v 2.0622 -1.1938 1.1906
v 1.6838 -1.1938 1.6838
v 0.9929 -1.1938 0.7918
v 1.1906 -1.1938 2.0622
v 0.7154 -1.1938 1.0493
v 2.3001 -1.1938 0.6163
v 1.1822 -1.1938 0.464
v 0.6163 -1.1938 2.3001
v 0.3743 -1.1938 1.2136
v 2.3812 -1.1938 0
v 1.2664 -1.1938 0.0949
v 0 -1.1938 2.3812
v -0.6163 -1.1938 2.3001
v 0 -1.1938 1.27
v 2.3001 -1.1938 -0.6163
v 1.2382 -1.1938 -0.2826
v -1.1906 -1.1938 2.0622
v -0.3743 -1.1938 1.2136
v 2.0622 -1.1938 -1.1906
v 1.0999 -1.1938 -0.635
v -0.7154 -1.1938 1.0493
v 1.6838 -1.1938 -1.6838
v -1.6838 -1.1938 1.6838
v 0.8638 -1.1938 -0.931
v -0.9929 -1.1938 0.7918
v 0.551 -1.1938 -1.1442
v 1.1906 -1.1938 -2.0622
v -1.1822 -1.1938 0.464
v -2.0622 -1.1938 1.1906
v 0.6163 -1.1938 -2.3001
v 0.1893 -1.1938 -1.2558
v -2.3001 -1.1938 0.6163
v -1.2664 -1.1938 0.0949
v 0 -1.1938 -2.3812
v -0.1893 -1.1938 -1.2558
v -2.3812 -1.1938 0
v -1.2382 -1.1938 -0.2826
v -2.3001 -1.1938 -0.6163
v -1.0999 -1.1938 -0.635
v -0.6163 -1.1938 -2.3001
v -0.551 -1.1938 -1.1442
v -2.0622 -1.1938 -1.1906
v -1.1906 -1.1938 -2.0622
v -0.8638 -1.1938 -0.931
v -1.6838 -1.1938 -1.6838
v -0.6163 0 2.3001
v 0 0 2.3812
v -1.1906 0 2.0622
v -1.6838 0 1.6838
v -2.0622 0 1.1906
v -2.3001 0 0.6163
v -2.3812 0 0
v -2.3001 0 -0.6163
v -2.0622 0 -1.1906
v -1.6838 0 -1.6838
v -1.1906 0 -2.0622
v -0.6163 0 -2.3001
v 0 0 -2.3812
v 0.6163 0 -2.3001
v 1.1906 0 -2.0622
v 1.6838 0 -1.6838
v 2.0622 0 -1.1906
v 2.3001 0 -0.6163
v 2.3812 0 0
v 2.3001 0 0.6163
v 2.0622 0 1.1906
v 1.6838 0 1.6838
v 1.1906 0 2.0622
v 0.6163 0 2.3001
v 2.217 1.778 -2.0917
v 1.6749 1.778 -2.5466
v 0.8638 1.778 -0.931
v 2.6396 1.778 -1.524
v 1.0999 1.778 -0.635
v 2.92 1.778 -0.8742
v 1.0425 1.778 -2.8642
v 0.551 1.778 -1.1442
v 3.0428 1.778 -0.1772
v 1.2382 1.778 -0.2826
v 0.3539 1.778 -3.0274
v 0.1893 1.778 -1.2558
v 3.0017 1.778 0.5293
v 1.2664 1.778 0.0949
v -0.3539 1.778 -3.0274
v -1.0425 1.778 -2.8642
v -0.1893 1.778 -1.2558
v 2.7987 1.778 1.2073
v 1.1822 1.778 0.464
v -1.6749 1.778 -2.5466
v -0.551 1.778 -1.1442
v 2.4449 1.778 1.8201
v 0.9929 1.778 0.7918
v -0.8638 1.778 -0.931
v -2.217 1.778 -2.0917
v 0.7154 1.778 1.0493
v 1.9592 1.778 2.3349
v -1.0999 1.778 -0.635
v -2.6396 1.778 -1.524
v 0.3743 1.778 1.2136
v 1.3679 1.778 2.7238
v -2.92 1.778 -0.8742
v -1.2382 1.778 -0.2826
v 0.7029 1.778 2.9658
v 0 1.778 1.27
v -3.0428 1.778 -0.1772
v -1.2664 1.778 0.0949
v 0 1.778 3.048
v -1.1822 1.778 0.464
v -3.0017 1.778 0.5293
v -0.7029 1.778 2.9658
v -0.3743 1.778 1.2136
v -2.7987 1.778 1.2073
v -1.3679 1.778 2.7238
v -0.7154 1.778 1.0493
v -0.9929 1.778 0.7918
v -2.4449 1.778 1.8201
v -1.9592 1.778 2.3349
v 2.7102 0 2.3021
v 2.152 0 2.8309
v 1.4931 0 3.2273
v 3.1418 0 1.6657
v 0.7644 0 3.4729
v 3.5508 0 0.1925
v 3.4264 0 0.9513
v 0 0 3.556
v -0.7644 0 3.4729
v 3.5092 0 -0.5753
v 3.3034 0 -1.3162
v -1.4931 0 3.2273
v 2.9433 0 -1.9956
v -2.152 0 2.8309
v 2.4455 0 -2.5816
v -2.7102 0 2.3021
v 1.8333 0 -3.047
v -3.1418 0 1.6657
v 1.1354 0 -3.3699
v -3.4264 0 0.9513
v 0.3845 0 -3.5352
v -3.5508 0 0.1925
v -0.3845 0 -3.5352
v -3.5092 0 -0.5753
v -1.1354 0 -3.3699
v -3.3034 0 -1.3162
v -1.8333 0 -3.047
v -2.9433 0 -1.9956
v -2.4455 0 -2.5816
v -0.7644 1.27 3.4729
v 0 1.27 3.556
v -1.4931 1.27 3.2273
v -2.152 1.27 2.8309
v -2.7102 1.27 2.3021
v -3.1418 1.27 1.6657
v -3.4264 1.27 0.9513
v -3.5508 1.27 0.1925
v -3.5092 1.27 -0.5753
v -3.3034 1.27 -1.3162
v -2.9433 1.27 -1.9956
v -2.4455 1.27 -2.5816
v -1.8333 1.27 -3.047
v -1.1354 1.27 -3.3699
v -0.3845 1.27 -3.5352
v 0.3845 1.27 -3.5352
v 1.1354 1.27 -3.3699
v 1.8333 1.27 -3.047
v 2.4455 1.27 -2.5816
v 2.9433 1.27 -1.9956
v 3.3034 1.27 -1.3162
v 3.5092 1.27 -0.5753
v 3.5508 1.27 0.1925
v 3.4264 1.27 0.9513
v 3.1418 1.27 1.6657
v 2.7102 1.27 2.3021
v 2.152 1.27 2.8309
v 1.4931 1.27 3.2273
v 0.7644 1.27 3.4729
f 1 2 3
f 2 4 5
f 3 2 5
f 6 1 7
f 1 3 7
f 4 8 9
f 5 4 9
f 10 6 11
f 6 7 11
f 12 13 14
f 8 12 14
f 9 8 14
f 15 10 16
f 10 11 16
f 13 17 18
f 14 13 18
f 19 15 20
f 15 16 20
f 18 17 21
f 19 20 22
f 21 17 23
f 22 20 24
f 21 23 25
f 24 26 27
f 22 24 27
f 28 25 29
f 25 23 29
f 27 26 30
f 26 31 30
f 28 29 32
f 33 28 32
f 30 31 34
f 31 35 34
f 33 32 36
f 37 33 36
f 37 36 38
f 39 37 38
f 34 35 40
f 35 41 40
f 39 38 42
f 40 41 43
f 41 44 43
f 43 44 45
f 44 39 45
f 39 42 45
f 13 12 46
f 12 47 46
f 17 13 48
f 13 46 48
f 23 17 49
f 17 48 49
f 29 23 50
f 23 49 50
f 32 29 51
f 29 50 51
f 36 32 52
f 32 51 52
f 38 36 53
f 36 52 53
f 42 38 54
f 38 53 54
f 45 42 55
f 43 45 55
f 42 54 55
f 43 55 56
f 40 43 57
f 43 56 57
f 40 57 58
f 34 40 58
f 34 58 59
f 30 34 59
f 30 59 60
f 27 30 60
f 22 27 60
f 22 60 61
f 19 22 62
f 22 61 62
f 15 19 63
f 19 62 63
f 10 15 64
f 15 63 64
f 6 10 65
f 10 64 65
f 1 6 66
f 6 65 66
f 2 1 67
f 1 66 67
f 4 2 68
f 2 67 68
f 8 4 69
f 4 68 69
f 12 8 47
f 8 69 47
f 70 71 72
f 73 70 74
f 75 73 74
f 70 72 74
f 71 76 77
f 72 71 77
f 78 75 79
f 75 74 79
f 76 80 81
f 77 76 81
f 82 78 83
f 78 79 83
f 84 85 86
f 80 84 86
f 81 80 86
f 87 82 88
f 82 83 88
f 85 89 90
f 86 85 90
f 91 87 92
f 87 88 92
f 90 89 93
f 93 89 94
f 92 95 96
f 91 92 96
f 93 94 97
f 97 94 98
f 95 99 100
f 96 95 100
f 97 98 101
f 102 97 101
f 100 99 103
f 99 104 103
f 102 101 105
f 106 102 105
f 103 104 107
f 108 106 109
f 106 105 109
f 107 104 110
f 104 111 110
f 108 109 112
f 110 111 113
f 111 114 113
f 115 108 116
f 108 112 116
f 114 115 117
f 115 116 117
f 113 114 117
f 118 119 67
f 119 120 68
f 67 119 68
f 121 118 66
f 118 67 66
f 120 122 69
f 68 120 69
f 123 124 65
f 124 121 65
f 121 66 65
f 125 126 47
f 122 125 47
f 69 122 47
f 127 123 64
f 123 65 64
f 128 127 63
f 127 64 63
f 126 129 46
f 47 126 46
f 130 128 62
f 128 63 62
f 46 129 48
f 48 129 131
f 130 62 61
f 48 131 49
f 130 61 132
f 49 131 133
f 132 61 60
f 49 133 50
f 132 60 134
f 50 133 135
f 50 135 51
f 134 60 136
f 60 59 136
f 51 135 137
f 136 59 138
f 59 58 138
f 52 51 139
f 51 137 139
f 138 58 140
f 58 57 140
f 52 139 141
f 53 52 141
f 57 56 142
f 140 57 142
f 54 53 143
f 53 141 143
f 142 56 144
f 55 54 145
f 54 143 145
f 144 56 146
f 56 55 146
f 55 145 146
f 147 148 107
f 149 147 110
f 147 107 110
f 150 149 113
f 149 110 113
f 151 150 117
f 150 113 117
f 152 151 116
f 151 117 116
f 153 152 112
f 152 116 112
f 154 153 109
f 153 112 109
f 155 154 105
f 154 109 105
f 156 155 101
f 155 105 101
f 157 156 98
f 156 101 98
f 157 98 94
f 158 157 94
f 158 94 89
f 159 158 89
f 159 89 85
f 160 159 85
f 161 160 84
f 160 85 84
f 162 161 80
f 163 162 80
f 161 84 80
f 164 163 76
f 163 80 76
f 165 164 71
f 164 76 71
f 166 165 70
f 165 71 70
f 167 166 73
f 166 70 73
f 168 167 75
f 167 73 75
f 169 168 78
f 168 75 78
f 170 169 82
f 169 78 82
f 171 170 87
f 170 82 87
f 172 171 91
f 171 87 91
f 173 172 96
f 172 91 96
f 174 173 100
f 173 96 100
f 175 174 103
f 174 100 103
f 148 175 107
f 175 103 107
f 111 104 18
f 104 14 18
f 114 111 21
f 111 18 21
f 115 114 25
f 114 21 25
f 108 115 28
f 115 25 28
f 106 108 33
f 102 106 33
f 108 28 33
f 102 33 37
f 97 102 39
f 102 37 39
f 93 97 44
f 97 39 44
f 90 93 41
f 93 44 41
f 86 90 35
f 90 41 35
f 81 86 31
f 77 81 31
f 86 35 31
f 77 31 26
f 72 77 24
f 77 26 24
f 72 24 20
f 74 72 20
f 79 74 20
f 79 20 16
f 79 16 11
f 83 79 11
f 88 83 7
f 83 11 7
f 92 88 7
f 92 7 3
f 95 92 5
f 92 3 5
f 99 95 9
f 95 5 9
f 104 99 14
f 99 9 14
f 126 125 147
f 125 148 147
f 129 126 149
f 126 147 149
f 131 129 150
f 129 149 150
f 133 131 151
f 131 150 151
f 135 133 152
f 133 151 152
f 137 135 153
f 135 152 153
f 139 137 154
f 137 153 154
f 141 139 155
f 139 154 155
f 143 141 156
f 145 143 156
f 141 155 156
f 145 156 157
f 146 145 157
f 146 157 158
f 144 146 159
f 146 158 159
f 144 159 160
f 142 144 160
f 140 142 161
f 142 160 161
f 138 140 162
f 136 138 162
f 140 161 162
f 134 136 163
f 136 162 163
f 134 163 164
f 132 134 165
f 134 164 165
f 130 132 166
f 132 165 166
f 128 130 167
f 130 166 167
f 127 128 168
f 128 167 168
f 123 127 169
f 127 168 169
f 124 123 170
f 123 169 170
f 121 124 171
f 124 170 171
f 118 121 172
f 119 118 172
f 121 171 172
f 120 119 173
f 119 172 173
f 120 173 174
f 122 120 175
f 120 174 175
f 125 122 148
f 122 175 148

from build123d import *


with BuildPart() as part:
    # Sketch1 → Boss-Revolve1 (revolve)
    with BuildSketch(Plane(origin=(0, 0, 0), x_dir=(0, 0, -1), z_dir=(1, 0, 0))):
        Polygon((-1.27, 1.778), (-1.27, -1.1938), (-2.38125, -1.1938), (-2.38125, 0), (-3.556, 0), (-3.556, 1.27), (-3.048, 1.778), align=None)
    revolve(axis=Axis((0, 40, 0), (0, -1, 0)))


solid = part.part
